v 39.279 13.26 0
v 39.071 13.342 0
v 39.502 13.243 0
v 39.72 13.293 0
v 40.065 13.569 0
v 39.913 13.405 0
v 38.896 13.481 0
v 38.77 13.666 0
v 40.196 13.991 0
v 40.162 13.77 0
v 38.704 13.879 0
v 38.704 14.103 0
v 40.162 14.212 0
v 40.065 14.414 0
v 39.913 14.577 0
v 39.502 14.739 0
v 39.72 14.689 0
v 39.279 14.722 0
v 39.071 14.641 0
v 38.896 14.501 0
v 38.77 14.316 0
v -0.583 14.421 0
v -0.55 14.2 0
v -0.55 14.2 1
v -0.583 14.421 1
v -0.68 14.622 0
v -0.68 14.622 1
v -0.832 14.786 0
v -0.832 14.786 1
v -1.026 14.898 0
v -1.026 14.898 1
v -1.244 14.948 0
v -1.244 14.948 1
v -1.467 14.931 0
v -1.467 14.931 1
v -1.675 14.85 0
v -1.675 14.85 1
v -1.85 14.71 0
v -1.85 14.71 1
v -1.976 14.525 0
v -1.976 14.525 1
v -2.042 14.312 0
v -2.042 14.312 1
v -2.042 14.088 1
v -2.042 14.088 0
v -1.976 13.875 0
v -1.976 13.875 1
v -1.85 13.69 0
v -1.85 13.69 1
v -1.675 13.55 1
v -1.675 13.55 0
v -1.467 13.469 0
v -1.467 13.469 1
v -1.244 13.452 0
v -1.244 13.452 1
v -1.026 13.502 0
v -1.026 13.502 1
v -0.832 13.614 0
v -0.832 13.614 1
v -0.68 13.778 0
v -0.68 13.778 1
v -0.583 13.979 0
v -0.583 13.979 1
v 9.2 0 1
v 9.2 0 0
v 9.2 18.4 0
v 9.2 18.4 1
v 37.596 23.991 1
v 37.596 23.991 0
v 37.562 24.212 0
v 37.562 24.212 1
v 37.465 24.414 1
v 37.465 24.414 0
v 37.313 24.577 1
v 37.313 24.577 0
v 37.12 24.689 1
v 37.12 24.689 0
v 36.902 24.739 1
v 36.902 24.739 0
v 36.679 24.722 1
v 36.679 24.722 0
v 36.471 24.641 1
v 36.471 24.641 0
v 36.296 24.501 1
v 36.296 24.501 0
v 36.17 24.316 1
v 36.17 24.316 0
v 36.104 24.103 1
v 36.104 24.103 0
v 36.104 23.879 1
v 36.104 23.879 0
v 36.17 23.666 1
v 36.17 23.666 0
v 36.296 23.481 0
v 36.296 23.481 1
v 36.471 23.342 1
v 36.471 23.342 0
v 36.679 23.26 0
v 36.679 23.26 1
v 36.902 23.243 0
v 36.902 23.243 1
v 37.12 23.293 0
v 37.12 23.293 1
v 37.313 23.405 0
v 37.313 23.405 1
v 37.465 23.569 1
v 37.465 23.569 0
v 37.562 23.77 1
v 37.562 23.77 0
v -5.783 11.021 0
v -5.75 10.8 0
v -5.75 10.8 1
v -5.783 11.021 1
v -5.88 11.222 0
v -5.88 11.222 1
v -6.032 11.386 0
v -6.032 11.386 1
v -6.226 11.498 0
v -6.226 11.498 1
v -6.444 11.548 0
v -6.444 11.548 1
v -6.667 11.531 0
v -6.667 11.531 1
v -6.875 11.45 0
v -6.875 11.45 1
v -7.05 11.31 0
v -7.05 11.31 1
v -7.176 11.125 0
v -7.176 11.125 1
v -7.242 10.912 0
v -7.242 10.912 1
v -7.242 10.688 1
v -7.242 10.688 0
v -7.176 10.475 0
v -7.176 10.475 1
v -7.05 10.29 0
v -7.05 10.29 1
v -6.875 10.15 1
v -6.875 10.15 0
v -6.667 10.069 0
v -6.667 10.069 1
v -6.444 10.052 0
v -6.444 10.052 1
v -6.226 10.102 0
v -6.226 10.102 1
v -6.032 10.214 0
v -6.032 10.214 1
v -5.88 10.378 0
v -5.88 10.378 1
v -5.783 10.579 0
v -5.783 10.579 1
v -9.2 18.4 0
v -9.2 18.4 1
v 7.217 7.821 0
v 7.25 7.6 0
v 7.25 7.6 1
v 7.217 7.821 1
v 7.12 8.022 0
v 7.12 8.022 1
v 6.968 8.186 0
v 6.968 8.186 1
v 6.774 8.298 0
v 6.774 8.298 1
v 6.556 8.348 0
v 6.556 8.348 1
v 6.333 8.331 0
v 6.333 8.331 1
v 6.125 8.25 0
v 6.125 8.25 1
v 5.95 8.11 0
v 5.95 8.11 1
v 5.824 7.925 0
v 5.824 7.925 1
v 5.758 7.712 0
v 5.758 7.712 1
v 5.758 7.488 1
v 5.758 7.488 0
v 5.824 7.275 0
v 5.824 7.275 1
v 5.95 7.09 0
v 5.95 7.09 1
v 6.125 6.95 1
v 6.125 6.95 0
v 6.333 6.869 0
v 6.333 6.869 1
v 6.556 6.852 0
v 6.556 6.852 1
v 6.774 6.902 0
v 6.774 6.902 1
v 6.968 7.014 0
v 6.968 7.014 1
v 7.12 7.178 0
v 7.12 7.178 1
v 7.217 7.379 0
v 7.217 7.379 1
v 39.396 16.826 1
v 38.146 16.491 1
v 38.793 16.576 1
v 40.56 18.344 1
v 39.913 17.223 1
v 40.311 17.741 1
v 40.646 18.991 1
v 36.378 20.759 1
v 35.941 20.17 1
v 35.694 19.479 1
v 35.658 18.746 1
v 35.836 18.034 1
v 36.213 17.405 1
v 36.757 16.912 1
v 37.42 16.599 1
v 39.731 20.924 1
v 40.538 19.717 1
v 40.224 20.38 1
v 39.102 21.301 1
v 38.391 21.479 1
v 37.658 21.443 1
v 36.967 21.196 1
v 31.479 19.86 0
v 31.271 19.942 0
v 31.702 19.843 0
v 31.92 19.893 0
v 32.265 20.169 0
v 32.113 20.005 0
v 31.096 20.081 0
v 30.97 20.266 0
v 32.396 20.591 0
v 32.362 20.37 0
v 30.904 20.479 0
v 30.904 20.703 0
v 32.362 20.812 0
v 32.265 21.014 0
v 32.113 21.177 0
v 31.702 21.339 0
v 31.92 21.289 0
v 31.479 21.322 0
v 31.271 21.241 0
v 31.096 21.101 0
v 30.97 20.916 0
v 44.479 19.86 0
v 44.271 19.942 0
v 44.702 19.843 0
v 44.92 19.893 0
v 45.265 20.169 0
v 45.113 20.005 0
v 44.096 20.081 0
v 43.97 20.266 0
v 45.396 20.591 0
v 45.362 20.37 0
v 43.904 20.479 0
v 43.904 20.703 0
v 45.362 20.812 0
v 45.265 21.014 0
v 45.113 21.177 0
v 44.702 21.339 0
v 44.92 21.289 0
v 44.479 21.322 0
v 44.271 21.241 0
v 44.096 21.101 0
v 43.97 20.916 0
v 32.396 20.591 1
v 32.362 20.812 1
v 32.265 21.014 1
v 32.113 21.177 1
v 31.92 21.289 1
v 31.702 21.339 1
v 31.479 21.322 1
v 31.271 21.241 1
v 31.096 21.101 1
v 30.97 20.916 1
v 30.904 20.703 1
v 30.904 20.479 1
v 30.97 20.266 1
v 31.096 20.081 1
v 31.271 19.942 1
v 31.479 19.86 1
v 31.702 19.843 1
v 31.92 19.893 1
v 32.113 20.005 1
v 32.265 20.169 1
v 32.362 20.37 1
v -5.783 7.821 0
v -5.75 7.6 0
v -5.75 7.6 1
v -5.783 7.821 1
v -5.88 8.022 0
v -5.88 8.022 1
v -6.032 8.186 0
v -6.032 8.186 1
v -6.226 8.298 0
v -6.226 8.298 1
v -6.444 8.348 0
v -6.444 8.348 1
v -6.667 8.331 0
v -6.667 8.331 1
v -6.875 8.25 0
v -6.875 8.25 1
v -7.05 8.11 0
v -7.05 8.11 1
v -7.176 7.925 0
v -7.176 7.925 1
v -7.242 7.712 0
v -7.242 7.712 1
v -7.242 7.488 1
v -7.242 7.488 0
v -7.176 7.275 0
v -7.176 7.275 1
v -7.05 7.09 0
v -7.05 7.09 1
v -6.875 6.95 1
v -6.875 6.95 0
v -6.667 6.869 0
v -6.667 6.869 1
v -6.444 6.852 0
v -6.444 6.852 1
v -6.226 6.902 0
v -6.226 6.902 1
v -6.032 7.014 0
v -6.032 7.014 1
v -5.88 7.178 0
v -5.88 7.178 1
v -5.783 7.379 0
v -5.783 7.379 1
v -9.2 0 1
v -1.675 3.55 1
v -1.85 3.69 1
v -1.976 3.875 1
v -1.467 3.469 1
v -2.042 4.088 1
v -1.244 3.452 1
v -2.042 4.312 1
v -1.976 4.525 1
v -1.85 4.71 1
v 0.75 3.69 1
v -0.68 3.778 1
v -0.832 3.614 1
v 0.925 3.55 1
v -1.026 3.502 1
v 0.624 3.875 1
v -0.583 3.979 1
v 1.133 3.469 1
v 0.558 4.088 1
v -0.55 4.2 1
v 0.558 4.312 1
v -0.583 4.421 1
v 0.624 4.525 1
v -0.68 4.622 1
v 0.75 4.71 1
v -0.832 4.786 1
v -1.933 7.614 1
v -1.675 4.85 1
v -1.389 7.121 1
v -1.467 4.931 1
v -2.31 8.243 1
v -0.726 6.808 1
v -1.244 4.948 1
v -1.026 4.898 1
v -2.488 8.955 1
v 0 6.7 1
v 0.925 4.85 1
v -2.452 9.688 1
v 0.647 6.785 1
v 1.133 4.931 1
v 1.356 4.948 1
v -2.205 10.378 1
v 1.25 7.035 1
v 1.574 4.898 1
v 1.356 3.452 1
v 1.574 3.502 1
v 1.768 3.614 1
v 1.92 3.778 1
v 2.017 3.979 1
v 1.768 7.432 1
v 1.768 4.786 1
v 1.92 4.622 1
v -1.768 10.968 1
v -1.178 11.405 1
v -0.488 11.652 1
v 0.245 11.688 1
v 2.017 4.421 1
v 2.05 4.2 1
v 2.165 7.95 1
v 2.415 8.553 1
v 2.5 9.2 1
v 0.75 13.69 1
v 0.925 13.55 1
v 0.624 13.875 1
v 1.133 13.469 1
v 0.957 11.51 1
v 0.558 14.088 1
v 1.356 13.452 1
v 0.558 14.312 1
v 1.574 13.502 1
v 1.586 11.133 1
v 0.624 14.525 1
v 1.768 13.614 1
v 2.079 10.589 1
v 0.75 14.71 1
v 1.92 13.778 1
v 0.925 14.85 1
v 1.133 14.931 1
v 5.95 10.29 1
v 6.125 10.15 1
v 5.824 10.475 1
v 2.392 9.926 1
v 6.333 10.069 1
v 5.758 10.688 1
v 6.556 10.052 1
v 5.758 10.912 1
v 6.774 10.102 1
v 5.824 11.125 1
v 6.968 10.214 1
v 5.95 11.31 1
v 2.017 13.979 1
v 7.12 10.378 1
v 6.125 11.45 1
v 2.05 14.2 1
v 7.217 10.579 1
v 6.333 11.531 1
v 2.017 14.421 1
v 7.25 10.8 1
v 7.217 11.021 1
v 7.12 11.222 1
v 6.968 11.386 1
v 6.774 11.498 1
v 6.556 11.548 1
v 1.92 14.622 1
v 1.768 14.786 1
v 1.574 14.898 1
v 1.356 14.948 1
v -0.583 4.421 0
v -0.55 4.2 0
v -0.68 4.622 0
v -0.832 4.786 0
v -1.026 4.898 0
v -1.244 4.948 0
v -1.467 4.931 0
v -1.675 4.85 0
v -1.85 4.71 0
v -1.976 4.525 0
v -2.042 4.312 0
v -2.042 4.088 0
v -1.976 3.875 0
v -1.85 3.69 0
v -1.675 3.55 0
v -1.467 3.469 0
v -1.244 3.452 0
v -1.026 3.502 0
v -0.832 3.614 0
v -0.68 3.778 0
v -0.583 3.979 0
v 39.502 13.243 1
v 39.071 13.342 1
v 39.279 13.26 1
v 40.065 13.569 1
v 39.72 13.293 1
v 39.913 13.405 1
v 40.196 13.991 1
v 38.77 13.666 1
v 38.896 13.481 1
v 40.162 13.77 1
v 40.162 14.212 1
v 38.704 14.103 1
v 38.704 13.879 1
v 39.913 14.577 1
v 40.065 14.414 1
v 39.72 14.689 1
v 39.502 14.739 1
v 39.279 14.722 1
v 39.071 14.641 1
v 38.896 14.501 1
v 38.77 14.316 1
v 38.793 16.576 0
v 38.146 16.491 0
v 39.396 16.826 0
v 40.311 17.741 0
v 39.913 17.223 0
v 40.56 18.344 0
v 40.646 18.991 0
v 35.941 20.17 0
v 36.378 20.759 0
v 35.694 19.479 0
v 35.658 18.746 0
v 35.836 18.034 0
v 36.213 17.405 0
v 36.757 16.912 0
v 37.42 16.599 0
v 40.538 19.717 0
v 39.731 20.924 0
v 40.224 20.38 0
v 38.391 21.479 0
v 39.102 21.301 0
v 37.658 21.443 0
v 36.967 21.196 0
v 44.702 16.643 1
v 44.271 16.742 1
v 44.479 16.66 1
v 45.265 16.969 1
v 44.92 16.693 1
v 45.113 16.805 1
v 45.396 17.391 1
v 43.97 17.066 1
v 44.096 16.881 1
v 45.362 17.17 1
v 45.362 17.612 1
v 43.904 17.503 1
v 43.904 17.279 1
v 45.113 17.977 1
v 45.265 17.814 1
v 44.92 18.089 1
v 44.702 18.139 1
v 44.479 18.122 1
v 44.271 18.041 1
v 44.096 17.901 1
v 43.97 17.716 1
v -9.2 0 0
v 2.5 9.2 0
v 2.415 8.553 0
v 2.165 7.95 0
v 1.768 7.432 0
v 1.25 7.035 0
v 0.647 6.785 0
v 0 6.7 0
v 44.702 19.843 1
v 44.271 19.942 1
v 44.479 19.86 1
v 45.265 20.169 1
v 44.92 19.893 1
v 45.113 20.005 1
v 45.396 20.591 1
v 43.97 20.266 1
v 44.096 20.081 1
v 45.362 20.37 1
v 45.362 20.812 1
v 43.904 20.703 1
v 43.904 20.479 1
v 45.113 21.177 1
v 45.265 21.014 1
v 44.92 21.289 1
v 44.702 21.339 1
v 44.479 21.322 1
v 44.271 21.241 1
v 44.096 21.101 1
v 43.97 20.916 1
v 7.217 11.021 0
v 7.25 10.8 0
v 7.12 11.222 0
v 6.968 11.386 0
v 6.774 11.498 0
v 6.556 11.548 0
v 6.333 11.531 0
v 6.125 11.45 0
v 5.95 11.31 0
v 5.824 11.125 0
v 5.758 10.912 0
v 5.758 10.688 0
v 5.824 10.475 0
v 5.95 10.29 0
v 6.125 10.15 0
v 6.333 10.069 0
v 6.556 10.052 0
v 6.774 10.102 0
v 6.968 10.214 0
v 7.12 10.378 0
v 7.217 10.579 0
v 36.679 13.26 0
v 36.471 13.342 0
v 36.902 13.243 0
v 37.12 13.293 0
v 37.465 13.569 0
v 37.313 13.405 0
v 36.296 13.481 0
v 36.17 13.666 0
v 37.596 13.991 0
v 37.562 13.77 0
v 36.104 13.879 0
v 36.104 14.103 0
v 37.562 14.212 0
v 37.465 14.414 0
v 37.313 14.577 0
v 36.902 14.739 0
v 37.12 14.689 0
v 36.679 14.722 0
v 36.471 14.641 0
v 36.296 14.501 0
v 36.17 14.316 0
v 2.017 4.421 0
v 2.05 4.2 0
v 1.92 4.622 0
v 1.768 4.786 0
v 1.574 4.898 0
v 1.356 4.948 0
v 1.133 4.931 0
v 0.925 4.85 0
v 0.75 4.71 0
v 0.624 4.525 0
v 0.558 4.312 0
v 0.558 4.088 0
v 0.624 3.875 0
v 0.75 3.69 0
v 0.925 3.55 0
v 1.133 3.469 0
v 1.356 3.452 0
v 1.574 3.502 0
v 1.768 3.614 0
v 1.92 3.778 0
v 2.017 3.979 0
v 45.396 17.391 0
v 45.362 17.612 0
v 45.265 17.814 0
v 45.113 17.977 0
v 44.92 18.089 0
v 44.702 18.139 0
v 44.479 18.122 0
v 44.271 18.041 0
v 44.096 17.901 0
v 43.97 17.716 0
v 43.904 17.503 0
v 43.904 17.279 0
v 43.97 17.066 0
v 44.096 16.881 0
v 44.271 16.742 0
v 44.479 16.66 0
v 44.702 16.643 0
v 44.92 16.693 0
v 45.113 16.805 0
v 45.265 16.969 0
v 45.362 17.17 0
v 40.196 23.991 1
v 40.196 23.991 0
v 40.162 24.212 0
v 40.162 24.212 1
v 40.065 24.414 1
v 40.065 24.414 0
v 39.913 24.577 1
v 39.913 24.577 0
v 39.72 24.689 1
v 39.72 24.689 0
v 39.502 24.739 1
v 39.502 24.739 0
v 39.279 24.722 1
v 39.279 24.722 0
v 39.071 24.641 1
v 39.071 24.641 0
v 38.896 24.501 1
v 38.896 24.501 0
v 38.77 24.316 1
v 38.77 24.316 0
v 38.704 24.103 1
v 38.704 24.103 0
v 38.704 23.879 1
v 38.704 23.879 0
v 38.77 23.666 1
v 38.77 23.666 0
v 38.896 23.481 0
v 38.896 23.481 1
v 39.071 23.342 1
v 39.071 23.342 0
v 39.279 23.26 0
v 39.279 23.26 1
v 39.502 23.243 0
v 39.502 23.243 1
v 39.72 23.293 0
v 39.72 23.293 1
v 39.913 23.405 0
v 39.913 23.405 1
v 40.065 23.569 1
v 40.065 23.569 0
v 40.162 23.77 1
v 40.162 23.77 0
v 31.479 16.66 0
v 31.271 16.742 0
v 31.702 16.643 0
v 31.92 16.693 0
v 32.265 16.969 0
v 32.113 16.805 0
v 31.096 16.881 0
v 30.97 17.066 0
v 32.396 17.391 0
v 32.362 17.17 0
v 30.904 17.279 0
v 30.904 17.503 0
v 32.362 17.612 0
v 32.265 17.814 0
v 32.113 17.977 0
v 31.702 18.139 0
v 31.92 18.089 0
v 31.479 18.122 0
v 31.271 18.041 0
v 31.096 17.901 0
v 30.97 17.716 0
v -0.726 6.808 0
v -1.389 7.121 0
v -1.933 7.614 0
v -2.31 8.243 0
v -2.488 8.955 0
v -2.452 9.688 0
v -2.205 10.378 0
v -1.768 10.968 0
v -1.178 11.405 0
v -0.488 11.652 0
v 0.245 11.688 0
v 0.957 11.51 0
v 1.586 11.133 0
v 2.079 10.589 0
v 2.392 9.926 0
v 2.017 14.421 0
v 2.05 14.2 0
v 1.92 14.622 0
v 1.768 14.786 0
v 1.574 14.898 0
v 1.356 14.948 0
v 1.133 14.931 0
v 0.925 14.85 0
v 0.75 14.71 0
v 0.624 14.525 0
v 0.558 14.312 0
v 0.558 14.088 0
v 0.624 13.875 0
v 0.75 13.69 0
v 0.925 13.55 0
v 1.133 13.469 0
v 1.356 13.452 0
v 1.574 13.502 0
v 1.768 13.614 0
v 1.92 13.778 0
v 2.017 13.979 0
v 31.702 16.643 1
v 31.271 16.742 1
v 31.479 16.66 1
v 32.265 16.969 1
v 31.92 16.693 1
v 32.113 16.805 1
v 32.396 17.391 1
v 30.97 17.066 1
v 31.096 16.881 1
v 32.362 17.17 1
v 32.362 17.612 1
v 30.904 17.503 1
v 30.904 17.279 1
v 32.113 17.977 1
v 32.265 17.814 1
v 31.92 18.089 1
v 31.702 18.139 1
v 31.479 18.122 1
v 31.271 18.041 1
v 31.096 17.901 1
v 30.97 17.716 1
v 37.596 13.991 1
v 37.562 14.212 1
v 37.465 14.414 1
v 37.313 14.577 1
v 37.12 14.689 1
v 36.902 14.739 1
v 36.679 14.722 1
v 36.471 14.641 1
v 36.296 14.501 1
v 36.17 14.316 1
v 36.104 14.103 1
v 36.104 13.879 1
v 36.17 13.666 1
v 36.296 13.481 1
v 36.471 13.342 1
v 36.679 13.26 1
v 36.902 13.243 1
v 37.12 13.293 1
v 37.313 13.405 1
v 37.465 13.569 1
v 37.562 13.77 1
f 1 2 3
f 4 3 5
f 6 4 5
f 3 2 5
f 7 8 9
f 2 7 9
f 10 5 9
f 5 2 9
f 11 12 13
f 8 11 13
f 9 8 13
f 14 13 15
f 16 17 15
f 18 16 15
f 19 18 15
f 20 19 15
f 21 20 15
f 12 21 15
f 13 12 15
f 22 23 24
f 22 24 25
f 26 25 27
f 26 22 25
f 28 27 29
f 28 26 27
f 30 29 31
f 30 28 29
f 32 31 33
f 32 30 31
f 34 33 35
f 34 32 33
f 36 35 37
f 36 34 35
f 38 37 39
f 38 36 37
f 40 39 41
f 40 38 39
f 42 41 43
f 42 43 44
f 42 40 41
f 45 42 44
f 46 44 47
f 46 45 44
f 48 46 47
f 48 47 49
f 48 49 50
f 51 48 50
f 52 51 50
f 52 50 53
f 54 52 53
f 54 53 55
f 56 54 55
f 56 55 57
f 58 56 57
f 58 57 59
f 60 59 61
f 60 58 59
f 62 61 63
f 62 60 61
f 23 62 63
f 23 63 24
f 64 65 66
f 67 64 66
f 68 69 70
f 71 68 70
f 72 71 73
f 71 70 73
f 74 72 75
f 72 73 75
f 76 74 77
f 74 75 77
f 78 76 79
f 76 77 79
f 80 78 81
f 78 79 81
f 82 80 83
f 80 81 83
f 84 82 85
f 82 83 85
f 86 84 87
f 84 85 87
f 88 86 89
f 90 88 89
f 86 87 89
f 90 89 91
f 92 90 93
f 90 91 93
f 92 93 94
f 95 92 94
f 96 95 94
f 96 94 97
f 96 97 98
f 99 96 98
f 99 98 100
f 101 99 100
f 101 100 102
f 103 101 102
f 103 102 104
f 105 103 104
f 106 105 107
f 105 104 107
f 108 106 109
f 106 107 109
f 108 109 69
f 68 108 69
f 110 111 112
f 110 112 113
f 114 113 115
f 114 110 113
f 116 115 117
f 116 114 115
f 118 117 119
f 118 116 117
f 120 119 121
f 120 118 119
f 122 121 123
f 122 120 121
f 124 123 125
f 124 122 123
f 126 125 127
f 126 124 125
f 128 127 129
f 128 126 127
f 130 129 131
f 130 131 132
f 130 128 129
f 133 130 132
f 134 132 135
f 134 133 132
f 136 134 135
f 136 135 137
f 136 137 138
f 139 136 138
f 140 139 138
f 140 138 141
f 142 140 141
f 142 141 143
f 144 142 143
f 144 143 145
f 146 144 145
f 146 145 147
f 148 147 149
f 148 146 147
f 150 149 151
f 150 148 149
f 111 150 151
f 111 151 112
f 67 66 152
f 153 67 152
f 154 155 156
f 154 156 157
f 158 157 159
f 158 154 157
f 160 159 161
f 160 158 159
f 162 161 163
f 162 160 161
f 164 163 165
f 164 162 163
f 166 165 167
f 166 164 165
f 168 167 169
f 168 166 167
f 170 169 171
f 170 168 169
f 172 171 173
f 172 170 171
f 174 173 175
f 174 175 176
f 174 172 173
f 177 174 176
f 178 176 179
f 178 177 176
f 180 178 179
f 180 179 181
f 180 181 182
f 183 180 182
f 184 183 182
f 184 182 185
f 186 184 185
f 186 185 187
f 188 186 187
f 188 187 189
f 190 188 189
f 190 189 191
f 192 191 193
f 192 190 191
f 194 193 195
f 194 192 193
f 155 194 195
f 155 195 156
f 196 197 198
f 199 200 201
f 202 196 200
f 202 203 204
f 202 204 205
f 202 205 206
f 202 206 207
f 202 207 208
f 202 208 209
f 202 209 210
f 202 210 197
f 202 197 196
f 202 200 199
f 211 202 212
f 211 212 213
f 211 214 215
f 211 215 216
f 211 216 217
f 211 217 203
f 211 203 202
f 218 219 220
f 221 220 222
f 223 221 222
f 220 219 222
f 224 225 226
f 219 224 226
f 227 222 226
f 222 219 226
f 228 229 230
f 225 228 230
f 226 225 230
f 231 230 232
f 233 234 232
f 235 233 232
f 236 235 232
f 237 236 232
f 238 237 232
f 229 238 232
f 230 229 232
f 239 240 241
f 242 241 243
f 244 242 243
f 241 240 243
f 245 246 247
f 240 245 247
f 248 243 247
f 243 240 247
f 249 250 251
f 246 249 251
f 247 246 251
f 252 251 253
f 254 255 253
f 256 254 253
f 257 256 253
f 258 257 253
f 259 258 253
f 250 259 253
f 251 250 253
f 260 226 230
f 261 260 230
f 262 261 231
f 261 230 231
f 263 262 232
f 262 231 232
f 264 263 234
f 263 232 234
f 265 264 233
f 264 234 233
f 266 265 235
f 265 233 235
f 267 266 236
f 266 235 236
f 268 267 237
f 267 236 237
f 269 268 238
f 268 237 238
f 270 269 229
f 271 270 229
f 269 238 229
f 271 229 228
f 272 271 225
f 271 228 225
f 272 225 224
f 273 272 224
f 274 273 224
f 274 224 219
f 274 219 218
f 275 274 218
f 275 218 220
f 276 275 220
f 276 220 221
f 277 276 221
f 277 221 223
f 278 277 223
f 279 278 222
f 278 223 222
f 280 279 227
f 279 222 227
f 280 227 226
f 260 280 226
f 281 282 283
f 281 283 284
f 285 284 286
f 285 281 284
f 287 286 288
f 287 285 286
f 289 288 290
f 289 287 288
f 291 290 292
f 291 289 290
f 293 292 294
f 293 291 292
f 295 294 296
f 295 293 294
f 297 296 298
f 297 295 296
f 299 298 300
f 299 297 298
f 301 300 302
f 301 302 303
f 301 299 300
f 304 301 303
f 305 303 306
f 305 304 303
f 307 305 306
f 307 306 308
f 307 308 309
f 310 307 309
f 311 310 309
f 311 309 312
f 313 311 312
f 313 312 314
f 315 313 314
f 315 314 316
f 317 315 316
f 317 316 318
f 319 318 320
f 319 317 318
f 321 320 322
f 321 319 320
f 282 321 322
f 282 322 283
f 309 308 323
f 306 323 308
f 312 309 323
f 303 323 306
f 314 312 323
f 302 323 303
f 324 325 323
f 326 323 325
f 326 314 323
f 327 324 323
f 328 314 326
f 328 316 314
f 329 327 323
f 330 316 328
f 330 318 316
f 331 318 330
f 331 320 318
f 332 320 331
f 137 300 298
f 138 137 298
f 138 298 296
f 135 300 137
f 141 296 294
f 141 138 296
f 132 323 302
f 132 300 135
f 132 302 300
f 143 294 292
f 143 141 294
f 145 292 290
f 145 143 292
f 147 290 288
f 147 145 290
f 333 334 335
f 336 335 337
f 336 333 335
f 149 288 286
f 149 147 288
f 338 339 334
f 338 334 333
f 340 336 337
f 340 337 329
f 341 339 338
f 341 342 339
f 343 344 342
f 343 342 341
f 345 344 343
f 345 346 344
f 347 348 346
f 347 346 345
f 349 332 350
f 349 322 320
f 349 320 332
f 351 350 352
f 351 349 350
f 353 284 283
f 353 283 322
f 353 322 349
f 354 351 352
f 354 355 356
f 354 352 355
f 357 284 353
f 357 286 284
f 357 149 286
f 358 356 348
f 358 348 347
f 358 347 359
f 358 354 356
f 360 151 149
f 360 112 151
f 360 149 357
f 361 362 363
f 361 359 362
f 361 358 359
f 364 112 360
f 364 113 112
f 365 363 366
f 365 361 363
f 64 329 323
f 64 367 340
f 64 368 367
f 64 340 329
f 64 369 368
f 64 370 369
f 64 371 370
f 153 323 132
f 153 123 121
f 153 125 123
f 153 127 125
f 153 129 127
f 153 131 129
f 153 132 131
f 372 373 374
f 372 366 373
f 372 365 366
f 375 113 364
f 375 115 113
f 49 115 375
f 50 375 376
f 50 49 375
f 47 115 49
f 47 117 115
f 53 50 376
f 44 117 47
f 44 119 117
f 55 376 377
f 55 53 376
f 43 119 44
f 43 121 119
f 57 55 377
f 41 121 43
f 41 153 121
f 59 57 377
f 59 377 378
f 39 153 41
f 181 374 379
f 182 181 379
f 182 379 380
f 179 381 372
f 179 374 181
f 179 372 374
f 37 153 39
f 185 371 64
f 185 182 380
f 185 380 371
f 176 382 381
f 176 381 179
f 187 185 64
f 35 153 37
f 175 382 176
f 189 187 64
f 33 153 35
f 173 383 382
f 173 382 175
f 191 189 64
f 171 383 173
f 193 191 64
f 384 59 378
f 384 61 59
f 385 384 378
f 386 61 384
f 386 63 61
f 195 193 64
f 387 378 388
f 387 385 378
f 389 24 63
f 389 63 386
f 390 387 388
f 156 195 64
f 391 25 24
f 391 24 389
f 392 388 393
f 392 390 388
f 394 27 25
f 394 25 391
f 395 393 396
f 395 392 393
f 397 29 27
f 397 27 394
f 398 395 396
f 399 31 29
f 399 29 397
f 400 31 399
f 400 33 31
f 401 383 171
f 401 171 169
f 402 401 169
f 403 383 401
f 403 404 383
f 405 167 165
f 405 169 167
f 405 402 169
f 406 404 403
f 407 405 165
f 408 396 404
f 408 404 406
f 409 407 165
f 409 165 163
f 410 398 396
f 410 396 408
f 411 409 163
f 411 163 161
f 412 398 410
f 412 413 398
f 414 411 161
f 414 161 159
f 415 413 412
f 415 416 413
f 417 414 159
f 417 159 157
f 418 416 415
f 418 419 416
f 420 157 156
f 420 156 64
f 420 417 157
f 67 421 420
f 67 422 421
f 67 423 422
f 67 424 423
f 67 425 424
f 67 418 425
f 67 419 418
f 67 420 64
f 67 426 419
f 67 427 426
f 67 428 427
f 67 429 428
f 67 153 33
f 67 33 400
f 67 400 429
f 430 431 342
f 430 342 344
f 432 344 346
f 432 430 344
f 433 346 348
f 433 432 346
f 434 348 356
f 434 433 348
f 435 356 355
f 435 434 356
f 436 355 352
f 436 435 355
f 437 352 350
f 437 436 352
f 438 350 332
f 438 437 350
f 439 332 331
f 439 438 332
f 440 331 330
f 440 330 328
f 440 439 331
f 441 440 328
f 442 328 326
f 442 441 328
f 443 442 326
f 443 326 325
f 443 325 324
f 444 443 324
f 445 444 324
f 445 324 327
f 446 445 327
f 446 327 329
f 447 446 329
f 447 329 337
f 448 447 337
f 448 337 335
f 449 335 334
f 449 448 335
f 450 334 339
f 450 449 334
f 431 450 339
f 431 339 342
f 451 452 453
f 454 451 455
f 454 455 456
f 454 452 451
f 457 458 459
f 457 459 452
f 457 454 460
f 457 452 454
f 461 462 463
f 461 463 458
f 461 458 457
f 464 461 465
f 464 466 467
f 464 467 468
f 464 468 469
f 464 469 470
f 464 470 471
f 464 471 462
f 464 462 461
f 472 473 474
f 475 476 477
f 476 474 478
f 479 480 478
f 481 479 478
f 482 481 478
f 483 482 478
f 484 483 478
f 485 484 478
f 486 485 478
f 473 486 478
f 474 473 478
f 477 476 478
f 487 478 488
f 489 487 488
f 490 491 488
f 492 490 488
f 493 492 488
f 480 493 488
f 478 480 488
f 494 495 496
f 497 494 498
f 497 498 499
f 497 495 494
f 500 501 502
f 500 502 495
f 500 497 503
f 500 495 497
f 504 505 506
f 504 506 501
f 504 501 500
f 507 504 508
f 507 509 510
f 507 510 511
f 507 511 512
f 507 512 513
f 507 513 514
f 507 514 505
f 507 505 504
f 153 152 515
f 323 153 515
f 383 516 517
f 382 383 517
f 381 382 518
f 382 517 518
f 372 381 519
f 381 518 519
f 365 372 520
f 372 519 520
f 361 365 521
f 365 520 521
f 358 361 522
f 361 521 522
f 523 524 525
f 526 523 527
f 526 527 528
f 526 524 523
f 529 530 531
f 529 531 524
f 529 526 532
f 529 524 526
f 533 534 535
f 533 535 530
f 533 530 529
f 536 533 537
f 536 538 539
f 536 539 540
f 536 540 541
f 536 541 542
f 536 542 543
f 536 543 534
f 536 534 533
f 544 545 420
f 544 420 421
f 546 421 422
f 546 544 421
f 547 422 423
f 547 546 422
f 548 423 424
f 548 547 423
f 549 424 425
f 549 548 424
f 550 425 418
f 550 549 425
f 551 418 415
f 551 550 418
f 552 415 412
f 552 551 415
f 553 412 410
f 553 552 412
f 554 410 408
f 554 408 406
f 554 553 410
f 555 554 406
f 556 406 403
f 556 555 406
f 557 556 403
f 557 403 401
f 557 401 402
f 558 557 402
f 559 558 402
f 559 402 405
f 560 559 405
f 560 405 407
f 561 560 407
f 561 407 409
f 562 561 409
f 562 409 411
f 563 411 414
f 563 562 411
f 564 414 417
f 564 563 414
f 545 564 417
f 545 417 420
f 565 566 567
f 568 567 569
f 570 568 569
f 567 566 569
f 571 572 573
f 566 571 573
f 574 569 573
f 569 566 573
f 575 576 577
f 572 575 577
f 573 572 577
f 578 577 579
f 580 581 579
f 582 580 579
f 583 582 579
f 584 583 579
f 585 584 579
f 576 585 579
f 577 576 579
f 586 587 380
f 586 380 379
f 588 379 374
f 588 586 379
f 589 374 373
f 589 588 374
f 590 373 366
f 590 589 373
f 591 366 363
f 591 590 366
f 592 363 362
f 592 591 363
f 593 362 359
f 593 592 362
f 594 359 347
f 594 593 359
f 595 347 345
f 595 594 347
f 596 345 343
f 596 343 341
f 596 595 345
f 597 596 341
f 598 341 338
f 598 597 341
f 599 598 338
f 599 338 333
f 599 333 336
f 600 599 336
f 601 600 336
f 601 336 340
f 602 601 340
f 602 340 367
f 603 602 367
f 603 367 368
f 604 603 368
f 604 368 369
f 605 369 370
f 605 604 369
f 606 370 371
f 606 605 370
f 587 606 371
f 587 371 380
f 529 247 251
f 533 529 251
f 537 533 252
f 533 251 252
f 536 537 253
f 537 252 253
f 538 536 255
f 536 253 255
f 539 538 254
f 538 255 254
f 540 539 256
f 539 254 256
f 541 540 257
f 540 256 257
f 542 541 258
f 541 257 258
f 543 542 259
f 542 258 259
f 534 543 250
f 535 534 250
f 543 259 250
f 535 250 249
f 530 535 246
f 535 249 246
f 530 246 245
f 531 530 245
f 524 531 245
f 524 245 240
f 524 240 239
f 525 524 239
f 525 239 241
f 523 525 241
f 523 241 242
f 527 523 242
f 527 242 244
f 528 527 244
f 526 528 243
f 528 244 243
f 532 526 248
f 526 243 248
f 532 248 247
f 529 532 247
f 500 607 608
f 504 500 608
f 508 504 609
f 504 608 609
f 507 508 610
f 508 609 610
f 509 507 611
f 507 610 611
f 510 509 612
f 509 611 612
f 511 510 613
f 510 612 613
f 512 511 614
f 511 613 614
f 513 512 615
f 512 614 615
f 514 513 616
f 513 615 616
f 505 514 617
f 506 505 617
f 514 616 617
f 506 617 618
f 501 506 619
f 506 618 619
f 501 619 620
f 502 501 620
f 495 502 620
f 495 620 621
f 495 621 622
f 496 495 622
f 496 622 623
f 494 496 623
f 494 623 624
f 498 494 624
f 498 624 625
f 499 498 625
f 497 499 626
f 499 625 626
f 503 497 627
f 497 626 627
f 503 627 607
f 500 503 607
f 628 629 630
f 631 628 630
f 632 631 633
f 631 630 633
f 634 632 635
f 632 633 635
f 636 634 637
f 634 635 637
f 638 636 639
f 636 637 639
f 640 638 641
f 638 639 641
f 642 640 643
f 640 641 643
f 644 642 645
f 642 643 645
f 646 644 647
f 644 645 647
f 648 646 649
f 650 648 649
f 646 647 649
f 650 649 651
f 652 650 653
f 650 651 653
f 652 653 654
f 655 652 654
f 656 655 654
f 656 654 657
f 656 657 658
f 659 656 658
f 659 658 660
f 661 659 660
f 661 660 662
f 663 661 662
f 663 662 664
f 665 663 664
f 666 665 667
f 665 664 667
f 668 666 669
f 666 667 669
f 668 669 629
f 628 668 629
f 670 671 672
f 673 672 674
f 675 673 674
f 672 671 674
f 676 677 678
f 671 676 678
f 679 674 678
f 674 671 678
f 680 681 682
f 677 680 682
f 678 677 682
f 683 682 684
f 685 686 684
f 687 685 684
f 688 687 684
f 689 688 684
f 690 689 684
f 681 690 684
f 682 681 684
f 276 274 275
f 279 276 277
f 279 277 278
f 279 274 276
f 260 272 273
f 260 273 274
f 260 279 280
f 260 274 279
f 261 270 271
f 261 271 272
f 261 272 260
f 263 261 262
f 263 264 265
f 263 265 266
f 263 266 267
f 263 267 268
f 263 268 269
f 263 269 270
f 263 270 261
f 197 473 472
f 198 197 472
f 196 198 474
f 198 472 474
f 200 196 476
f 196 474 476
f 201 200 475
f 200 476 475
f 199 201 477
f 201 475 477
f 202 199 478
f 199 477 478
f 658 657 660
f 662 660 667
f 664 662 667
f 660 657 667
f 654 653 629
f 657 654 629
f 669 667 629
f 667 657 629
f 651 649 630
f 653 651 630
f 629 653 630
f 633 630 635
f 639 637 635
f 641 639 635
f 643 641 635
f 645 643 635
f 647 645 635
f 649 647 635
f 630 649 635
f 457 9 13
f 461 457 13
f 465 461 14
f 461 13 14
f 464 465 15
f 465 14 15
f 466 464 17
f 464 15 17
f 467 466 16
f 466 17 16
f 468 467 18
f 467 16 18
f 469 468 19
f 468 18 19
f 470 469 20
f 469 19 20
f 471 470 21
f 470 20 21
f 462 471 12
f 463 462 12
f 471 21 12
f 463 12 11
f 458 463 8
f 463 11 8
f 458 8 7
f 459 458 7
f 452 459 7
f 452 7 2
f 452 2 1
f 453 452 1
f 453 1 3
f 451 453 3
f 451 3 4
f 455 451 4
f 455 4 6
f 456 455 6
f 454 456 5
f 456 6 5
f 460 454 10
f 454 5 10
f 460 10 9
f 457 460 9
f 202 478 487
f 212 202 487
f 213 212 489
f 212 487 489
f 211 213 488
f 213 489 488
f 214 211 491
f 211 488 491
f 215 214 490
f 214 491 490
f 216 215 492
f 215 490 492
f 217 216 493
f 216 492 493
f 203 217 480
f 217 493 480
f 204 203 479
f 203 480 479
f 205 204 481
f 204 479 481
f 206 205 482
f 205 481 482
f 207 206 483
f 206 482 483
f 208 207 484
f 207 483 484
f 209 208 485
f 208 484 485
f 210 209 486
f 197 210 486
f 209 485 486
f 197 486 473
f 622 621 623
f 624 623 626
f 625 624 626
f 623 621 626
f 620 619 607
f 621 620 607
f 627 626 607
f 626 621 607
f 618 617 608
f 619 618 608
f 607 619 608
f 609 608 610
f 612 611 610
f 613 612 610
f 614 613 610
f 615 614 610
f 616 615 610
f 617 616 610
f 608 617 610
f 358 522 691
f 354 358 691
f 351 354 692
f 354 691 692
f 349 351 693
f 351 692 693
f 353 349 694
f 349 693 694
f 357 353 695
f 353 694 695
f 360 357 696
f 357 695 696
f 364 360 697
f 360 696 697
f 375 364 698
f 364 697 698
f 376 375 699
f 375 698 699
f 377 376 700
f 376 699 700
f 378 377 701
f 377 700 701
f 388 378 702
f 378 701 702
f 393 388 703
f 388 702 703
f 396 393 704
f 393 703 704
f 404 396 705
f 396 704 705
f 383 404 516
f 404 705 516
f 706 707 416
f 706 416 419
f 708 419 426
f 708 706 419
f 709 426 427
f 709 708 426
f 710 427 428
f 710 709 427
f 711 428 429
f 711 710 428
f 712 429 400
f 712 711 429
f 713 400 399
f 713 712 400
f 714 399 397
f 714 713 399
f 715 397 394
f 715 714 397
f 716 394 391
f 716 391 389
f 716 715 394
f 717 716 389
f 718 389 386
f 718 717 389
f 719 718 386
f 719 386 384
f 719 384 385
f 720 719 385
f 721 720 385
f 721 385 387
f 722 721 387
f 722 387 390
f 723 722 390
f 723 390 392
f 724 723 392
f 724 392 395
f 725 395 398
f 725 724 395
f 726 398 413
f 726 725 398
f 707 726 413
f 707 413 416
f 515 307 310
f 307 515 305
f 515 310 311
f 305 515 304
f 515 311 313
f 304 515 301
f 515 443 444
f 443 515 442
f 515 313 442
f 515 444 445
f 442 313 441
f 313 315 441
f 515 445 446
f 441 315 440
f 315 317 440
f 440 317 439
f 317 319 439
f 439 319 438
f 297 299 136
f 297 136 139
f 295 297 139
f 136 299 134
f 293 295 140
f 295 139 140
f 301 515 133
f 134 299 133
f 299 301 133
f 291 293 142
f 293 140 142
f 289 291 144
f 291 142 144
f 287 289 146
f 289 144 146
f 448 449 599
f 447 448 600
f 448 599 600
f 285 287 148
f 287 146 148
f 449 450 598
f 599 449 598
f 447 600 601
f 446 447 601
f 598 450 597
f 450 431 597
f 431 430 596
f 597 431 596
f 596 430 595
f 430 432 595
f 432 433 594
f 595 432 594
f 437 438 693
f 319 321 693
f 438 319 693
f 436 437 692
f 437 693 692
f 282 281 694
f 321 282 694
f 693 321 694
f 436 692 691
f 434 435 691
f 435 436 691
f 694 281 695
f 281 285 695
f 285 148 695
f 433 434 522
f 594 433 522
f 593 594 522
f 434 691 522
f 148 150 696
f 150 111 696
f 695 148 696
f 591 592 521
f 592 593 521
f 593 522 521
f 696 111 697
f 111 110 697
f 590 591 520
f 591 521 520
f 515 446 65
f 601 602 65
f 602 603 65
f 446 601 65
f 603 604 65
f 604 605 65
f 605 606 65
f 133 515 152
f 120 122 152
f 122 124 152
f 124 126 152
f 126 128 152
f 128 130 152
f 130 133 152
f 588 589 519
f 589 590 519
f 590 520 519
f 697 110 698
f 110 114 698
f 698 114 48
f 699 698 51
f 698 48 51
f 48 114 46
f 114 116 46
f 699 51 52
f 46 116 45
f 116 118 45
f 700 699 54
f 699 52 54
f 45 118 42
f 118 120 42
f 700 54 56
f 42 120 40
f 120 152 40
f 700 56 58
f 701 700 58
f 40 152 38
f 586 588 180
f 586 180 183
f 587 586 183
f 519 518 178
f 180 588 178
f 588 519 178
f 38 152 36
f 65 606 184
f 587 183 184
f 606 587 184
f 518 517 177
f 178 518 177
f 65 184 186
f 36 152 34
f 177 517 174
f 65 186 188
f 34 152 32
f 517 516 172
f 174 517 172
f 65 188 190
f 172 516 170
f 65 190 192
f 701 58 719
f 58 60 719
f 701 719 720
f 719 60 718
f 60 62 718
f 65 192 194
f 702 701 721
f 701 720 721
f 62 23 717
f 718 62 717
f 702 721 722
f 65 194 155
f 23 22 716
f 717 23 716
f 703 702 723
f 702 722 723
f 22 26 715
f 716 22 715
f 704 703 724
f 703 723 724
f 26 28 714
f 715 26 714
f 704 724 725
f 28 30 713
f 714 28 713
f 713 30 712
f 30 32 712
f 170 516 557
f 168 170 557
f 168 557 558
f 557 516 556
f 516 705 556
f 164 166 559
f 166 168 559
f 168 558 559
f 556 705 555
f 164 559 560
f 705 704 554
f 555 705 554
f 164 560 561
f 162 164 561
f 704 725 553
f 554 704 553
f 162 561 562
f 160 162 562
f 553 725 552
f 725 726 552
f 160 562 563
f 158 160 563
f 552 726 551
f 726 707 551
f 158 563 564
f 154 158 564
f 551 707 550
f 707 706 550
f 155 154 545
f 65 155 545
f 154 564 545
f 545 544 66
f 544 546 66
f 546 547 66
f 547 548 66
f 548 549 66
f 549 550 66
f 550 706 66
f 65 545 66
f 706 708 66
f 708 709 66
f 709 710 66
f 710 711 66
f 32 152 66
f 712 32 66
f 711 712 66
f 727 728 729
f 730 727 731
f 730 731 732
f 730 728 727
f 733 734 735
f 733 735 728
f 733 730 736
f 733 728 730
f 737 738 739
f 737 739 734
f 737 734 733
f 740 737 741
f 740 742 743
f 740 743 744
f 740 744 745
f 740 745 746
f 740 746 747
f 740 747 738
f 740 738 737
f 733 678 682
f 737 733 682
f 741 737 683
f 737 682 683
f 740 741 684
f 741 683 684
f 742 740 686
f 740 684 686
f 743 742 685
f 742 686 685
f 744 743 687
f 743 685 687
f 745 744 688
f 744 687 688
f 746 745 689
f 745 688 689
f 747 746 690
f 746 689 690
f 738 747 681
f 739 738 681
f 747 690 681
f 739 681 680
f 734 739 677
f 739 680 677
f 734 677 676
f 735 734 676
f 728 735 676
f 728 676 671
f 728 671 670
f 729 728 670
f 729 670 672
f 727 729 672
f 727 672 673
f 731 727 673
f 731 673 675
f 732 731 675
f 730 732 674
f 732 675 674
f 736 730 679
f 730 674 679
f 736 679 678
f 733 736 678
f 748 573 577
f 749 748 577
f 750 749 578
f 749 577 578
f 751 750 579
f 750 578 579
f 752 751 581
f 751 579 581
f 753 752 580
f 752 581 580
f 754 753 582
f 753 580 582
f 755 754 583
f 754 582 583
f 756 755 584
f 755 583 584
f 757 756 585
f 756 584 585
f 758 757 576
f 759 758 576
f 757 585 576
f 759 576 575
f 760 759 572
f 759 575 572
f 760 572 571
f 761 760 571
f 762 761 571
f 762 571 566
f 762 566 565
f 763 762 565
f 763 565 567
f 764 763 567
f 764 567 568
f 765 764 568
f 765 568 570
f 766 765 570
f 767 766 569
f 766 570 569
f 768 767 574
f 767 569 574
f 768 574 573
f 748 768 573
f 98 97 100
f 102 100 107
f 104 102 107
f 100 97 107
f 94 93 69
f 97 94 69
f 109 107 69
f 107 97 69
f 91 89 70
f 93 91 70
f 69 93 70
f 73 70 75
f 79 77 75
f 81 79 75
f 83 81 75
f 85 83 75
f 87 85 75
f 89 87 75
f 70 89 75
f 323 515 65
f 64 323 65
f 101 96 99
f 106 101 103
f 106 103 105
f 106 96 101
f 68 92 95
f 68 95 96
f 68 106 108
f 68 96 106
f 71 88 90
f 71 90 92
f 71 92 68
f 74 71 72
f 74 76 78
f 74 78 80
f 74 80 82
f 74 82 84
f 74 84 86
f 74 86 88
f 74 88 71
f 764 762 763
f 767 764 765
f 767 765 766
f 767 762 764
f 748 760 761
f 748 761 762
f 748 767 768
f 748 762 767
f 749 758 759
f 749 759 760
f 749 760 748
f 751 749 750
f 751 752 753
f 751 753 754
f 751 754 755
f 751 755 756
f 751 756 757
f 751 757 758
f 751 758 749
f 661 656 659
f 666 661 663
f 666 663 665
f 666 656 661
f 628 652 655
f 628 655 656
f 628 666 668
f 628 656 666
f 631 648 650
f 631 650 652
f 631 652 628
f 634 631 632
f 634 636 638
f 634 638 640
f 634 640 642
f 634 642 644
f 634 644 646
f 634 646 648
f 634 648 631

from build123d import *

# Parameters (mm, degrees)
F0_R     = 0.75
F1_DEPTH = 1


with BuildPart() as f1:
    # F0 (on Top) → F1 (new body)
    with BuildSketch(Plane.XY):
        with BuildLine():
            ThreePointArc((0, 6.7), (1.767767, 7.432233), (2.5, 9.2))
            ThreePointArc((2.5, 9.2), (-1.767767, 10.967767), (0, 6.7))
        make_face()
        Polygon((-9.2, 0), (0, 0), (9.2, 0), (9.2, 18.4), (0, 18.4), (-9.2, 18.4), align=None)
        with Locations((-1.3, 4.2)):
            Circle(F0_R, mode=Mode.SUBTRACT)
        with Locations((1.3, 4.2)):
            Circle(F0_R, mode=Mode.SUBTRACT)
        with Locations((-6.5, 7.6)):
            Circle(F0_R, mode=Mode.SUBTRACT)
        with BuildLine():
            ThreePointArc((0, 6.7), (-1.767767, 10.967767), (2.5, 9.2))
            ThreePointArc((2.5, 9.2), (1.767767, 7.432233), (0, 6.7))
        make_face(mode=Mode.SUBTRACT)
        with Locations((-6.5, 10.8)):
            Circle(F0_R, mode=Mode.SUBTRACT)
        with Locations((6.5, 7.6)):
            Circle(F0_R, mode=Mode.SUBTRACT)
        with Locations((6.5, 10.8)):
            Circle(F0_R, mode=Mode.SUBTRACT)
        with Locations((-1.3, 14.2)):
            Circle(F0_R, mode=Mode.SUBTRACT)
        with Locations((1.3, 14.2)):
            Circle(F0_R, mode=Mode.SUBTRACT)
        with Locations((36.845506, 13.991024)):
            Circle(F0_R)
        with Locations((36.845506, 23.991024)):
            Circle(F0_R)
        with Locations((39.445506, 23.991024)):
            Circle(F0_R)
        with Locations((39.445506, 13.991024)):
            Circle(F0_R)
        with Locations((44.645506, 17.391024)):
            Circle(F0_R)
        with Locations((44.645506, 20.591024)):
            Circle(F0_R)
        with Locations((31.645506, 20.591024)):
            Circle(F0_R)
        with Locations((31.645506, 17.391024)):
            Circle(F0_R)
        with BuildLine():
            ThreePointArc((38.145506, 16.491024), (39.913273, 17.223257), (40.645506, 18.991024))
            ThreePointArc((40.645506, 18.991024), (36.377739, 20.758791), (38.145506, 16.491024))
        make_face()
    extrude(amount=F1_DEPTH)


solid = f1.part
